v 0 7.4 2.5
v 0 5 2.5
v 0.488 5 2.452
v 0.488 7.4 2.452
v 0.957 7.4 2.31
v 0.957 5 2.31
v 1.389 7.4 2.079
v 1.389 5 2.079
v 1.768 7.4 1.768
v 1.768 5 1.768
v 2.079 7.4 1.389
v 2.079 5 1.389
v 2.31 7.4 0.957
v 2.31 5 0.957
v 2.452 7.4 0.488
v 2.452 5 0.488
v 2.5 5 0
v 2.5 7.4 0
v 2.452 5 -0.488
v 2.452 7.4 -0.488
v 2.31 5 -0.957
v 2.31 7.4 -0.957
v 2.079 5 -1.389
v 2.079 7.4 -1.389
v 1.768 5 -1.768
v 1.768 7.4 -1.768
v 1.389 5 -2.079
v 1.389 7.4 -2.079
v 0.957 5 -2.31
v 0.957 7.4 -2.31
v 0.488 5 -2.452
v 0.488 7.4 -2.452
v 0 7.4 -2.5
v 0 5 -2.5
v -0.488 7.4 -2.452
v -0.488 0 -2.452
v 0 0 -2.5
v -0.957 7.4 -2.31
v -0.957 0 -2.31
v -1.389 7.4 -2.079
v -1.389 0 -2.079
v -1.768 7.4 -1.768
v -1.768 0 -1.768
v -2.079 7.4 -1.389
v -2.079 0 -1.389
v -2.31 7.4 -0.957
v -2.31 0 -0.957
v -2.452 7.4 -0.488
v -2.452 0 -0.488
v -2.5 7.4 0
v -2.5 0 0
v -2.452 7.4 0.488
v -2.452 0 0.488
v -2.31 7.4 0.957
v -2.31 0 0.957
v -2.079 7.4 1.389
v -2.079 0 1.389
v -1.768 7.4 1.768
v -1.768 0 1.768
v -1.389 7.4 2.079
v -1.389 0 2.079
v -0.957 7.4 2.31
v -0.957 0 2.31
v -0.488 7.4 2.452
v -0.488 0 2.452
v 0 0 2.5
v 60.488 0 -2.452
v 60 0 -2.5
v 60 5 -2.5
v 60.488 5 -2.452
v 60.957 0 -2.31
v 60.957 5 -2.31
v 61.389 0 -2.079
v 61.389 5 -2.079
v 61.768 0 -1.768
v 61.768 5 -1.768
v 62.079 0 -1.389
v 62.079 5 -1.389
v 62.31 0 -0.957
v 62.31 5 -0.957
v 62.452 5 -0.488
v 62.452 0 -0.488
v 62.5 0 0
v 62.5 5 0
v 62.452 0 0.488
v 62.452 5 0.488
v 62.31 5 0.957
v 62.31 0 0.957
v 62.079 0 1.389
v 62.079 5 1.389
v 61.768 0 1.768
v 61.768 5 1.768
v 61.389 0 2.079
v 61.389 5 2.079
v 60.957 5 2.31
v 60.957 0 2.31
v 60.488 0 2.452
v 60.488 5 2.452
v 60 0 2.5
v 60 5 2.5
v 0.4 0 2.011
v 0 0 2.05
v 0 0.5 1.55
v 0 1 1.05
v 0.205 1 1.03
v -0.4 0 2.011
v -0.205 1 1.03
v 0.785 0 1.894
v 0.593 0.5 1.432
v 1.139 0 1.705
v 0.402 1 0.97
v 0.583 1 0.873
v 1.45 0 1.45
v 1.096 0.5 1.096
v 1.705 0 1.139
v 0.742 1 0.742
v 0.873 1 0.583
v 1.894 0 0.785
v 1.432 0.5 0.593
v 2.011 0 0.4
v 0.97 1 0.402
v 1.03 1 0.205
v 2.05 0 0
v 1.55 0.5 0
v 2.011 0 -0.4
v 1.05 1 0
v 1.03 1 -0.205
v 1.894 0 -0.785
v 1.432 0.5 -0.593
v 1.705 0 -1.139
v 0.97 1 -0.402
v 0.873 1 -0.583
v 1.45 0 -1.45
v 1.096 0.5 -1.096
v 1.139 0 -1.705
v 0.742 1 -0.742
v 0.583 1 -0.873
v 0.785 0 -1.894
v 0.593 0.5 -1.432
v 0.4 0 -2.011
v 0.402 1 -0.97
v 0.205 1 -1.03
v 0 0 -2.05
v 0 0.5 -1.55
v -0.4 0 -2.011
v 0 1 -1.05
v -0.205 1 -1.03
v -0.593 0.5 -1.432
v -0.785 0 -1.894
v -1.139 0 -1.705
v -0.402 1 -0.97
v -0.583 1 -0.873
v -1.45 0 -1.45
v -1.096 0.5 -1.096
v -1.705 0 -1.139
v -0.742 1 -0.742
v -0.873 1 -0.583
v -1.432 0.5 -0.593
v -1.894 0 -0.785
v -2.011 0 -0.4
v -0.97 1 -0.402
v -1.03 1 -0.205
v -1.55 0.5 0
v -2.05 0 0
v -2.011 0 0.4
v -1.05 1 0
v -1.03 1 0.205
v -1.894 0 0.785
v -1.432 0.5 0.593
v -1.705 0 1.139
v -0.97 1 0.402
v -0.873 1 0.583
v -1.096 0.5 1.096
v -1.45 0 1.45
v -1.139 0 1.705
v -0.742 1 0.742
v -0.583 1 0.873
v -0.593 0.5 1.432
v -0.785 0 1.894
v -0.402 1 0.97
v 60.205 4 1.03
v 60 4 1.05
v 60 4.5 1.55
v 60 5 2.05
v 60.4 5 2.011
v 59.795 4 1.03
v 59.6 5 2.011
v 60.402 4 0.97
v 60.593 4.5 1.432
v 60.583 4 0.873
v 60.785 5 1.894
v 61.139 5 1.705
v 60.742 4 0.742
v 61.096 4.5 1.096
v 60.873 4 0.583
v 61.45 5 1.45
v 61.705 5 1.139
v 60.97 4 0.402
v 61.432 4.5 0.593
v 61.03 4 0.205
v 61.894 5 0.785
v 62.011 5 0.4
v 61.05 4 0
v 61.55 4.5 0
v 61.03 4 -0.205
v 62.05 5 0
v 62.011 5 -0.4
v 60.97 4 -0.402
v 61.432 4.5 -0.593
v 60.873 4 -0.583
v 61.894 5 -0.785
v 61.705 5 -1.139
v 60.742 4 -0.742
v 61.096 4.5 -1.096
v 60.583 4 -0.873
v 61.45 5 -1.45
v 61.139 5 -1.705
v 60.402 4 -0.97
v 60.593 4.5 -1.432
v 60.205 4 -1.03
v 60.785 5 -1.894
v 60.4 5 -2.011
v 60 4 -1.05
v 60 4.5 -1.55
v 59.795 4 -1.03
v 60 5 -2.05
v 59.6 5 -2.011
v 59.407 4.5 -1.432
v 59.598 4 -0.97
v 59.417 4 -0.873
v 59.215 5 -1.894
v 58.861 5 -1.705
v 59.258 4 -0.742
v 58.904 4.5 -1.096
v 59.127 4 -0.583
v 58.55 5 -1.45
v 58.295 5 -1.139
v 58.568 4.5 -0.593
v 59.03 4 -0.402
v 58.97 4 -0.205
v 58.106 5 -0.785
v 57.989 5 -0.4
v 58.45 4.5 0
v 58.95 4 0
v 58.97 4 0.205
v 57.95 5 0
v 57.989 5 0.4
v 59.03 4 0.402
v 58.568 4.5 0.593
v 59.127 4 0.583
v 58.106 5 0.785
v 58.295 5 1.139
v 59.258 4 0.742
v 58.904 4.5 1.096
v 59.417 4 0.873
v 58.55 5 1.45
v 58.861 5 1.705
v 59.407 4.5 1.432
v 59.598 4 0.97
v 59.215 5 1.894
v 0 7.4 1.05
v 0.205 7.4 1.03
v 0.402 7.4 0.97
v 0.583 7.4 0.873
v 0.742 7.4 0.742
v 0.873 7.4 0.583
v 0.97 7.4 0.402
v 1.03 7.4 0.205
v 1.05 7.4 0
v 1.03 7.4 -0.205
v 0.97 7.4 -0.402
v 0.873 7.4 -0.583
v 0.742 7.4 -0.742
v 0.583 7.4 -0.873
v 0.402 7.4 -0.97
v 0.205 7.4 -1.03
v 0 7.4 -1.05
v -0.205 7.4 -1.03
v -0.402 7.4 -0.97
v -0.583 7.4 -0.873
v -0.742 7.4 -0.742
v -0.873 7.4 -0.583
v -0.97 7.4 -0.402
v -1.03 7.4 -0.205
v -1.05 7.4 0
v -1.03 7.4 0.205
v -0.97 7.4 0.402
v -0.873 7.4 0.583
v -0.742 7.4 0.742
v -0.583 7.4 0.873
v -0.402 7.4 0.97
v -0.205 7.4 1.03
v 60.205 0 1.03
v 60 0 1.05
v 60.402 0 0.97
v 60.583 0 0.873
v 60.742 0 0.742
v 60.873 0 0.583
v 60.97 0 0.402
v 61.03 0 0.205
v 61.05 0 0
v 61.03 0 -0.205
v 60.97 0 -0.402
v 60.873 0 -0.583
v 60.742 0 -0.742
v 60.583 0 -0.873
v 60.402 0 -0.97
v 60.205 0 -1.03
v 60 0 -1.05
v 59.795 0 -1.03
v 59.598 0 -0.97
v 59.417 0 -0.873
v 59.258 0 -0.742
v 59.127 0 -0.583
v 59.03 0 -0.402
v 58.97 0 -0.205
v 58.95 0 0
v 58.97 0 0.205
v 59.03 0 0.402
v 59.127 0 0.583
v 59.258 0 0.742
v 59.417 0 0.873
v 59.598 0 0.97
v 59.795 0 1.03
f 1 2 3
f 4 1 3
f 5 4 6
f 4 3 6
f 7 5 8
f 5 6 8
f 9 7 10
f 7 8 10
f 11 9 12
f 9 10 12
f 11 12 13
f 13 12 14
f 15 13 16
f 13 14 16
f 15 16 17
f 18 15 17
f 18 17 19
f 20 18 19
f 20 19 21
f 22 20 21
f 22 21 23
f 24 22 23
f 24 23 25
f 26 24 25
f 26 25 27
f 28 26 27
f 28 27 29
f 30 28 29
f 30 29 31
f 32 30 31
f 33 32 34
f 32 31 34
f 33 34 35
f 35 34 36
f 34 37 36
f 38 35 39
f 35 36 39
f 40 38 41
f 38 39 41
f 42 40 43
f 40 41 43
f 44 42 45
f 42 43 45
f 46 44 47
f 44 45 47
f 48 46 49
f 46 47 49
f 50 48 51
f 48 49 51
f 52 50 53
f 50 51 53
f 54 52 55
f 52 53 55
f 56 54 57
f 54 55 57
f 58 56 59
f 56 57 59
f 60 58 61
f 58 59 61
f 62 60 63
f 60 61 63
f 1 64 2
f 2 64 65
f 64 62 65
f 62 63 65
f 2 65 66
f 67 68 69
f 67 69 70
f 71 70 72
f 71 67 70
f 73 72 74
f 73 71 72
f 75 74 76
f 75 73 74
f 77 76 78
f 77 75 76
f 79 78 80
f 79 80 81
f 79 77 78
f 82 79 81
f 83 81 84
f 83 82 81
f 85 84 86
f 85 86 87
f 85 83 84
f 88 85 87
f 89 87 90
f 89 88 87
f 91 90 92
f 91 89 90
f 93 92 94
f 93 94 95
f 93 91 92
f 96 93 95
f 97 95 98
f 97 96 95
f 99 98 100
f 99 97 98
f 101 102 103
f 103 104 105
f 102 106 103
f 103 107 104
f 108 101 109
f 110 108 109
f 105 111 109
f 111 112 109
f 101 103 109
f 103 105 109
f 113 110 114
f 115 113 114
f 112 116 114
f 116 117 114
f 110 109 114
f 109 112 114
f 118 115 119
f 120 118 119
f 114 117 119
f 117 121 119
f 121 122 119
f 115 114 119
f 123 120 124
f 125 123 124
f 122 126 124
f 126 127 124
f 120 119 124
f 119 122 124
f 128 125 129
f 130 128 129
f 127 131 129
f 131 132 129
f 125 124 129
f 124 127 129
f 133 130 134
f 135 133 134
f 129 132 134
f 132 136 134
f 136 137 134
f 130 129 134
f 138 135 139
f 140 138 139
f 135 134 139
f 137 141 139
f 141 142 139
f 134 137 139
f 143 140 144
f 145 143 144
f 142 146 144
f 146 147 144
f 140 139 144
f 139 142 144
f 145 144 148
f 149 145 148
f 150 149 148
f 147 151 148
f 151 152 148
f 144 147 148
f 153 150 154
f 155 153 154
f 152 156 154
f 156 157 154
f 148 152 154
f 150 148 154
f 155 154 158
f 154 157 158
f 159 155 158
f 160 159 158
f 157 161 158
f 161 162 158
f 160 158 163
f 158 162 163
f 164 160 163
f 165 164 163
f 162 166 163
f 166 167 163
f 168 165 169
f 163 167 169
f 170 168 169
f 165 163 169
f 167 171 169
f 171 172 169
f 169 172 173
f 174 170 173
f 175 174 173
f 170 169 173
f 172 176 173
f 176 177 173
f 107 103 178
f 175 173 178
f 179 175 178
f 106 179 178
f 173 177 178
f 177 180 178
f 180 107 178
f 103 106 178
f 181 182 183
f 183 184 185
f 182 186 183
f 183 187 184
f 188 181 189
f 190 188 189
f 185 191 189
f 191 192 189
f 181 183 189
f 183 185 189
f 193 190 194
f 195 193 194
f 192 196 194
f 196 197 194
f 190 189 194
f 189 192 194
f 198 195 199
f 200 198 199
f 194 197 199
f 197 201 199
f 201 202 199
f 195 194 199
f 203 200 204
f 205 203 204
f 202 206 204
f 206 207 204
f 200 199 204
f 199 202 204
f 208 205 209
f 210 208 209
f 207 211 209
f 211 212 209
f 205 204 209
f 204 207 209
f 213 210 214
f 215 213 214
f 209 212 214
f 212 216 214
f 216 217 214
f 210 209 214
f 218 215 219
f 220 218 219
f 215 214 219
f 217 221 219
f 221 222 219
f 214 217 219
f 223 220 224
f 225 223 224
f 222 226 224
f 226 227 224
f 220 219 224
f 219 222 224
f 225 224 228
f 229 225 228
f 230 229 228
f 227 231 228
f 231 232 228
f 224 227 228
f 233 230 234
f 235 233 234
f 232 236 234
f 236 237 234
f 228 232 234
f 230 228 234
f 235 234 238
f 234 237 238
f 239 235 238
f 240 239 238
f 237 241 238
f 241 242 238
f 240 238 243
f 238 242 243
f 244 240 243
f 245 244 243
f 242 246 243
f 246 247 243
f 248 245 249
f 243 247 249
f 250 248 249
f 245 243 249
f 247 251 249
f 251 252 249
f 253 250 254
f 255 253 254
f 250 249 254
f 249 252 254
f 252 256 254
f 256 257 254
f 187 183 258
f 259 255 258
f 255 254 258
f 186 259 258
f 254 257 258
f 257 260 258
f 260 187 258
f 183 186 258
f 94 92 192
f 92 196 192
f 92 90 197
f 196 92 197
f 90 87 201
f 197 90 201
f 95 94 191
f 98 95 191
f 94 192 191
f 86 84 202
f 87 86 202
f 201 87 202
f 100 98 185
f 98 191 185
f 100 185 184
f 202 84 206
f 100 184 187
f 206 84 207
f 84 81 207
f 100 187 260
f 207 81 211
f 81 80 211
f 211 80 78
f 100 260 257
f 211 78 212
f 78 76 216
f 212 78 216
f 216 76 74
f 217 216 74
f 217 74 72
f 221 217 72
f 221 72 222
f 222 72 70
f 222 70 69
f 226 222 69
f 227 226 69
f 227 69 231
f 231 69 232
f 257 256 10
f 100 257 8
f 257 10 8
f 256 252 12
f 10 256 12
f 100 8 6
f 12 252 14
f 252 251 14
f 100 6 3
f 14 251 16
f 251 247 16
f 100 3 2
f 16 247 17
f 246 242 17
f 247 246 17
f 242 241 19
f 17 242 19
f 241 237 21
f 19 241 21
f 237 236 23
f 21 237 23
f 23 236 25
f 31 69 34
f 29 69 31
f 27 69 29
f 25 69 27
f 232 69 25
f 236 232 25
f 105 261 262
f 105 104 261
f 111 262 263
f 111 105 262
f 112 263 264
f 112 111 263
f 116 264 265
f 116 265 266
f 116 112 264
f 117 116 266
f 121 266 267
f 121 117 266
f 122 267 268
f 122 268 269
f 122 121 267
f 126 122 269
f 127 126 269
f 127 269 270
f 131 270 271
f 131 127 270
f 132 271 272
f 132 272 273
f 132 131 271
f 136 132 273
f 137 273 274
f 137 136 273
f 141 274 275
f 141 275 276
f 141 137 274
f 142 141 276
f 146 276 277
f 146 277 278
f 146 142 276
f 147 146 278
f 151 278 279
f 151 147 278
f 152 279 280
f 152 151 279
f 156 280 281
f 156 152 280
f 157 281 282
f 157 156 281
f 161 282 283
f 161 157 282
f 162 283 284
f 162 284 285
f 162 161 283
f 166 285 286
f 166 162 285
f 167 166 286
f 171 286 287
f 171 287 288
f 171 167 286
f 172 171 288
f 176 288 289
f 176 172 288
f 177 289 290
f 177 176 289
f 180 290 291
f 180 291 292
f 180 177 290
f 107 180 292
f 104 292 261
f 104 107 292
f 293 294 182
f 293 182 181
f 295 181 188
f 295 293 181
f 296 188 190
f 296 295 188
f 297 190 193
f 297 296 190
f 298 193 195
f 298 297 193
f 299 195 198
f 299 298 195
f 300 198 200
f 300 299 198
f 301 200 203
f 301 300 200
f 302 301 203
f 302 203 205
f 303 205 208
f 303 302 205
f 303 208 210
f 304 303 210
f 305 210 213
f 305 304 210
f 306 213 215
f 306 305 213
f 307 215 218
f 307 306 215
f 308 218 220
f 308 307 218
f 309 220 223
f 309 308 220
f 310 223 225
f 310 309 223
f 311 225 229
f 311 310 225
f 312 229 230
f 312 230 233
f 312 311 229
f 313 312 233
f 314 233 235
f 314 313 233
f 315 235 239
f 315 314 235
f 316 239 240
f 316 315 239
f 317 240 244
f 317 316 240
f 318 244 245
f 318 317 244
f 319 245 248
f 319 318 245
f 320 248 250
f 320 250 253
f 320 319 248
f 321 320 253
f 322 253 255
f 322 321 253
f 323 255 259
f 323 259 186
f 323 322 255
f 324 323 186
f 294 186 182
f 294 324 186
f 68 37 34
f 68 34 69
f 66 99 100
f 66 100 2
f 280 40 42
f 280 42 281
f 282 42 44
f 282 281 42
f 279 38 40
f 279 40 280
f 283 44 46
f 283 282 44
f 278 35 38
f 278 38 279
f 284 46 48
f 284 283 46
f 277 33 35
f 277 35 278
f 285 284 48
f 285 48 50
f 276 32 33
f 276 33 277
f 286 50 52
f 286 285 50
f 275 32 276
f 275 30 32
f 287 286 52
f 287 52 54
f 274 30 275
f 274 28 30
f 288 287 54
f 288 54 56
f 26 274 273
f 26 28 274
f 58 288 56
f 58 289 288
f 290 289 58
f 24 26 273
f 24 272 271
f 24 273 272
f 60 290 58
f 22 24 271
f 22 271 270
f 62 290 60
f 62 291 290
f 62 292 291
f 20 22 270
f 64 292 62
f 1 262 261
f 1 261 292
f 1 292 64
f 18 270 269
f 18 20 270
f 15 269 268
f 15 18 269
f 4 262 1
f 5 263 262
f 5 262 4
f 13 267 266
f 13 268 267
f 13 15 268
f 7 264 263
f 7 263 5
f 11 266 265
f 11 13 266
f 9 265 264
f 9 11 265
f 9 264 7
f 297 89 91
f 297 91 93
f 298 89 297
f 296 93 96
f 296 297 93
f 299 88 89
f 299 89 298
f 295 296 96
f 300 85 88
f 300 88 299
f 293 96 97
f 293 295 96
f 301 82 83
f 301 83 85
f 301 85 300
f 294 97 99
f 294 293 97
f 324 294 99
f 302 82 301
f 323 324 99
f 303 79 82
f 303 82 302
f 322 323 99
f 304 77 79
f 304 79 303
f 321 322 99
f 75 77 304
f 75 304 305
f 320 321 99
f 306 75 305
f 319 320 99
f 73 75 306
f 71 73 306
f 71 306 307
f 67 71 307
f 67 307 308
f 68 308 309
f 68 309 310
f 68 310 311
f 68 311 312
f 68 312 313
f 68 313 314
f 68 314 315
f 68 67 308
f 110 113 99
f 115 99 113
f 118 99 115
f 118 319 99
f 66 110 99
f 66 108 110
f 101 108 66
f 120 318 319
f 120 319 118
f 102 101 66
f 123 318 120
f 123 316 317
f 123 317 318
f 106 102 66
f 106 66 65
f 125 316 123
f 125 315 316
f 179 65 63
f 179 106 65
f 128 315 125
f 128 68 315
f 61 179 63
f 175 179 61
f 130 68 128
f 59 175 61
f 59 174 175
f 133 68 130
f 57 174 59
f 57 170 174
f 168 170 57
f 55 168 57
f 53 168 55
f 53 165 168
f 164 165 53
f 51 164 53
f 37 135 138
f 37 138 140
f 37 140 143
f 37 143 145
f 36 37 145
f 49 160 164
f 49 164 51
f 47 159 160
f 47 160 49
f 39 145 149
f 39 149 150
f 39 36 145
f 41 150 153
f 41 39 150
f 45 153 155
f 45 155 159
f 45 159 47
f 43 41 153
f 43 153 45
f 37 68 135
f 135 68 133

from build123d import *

# Parameters (mm, degrees)
SKETCH1_R           = 1.05
BOSS_EXTRUDE1_DEPTH = 5
CHAMFER1_SIZE       = 1
CHAMFER2_SIZE       = 1
SKETCH2_R           = 2.5
SKETCH2_R_2         = 1.05
BOSS_EXTRUDE2_DEPTH = 2.4


with BuildPart() as part:
    # Sketch1 → Boss-Extrude1 (new body)
    with BuildSketch(Plane(origin=(0, 0, 0), x_dir=(1, 0, 0), z_dir=(0, 1, 0))):
        with BuildLine():
            Line((0, 2.5), (60, 2.5))
            ThreePointArc((60, 2.5), (62.5, 0), (60, -2.5))
            Line((60, -2.5), (0, -2.5))
            ThreePointArc((0, -2.5), (-2.5, 0), (0, 2.5))
        make_face()
        with Locations(Location((0, 0, 0), (0, 0, 270))):
            Circle(SKETCH1_R, mode=Mode.SUBTRACT)
        with Locations(Location((60, 0, 0), (0, 0, 270))):
            Circle(SKETCH1_R, mode=Mode.SUBTRACT)
    extrude(amount=BOSS_EXTRUDE1_DEPTH)

    # Chamfer1
    chamfer1_edges = [part.edges().sort_by_distance(p)[0] for p in [
        (60, 5, -1.05),
    ]]
    chamfer(chamfer1_edges, length=CHAMFER1_SIZE)

    # Chamfer2
    chamfer2_edges = [part.edges().sort_by_distance(p)[0] for p in [
        (0, 0, -1.05),
    ]]
    chamfer(chamfer2_edges, length=CHAMFER2_SIZE)

    # Sketch2 → Boss-Extrude2 (add)
    with BuildSketch(Plane(origin=(0, 5, 0), x_dir=(1, 0, 0), z_dir=(0, 1, 0))):
        with Locations(Location((0, 0, 0), (0, 0, 270))):
            Circle(SKETCH2_R)
        with Locations(Location((0, 0, 0), (0, 0, 270))):
            Circle(SKETCH2_R_2, mode=Mode.SUBTRACT)
    extrude(amount=BOSS_EXTRUDE2_DEPTH)


solid = part.part
